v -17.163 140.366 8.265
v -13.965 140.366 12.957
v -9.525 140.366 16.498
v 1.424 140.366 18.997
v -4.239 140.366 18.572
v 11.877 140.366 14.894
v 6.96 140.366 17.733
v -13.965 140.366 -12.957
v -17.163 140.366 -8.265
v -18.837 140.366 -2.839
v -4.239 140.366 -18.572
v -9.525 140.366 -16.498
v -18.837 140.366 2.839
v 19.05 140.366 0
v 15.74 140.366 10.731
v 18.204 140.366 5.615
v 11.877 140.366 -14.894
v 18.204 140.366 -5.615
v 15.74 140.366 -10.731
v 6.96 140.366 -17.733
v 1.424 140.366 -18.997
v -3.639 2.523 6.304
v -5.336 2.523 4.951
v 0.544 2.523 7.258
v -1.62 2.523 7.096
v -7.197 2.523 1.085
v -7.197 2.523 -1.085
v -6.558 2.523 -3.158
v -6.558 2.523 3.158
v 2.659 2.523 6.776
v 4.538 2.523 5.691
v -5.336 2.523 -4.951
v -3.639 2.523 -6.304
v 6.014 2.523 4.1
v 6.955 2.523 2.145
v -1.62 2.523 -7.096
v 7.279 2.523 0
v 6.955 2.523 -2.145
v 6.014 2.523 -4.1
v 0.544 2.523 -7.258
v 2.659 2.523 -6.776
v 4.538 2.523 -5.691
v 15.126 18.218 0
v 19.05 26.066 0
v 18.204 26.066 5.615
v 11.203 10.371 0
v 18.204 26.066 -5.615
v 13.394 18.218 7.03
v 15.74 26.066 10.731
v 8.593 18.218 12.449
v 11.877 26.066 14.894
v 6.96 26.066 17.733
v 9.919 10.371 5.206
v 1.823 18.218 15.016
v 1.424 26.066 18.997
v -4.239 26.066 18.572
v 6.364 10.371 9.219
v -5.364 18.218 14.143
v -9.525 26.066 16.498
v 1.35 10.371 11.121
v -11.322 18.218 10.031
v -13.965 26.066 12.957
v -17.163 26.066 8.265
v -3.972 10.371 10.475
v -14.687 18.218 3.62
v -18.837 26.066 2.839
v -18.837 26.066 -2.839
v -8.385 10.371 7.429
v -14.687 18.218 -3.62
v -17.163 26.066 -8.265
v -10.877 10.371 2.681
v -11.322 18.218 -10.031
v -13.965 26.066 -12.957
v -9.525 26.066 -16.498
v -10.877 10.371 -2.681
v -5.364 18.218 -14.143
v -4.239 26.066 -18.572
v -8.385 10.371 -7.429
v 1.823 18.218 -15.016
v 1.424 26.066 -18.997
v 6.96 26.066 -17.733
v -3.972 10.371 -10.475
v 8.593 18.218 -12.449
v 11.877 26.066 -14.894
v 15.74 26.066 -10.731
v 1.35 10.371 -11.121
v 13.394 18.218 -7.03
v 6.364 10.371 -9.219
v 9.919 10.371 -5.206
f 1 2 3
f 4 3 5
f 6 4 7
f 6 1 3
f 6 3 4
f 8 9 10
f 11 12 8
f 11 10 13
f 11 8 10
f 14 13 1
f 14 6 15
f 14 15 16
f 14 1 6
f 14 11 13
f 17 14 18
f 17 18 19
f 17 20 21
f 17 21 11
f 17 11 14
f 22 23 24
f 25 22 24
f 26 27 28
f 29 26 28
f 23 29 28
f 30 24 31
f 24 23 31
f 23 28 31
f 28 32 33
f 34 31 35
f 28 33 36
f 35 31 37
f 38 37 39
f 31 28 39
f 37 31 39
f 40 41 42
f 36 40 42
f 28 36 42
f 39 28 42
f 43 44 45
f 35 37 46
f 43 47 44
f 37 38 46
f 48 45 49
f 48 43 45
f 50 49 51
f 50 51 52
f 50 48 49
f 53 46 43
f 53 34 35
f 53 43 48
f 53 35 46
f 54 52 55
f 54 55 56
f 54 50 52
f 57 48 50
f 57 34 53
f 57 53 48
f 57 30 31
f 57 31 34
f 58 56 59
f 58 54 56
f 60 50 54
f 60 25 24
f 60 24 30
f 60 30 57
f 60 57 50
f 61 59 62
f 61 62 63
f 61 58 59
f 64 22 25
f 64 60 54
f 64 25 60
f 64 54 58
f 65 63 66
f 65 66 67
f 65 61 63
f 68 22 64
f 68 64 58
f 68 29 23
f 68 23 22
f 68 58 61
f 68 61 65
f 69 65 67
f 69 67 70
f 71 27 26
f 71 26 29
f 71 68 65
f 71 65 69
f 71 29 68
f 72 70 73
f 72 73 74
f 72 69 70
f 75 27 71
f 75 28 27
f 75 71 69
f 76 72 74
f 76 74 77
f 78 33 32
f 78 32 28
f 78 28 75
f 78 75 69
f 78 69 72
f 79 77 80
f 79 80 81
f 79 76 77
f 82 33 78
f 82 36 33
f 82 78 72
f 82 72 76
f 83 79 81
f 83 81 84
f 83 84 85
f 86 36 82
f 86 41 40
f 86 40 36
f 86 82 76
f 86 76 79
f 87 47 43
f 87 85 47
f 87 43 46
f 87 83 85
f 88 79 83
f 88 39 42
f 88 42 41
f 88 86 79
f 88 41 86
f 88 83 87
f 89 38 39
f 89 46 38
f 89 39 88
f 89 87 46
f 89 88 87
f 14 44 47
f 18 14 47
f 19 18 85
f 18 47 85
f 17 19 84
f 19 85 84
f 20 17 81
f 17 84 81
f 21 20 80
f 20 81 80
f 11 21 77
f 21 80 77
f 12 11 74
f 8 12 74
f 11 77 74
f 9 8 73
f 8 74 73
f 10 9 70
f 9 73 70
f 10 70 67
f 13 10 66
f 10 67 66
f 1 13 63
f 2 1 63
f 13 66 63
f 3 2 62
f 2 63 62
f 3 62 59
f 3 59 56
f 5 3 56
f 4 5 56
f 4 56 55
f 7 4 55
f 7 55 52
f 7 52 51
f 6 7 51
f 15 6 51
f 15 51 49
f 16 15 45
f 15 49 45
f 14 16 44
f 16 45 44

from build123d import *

# Parameters (mm, degrees)
SKETCH2_R               = 19.05
BOSS_EXTRUDE1_DEPTH     = 114.3
CUT_EXTRUDE5_DEPTH      = 20.05
CUT_EXTRUDE5_DEPTH_BACK = 20.05


with BuildPart() as part:
    # Sketch1 → Revolve1 (revolve)
    with BuildSketch(Plane.XY):
        Polygon((0, 26.065803987), (19.05, 26.065803987), (0, -12.034196013), align=None)
    revolve(axis=Axis((0, 32.664443941, 0), (0, -1, 0)))

    # Sketch2 → Boss-Extrude1 (add)
    with BuildSketch(Plane(origin=(0, 26.065803987, 0), x_dir=(1, 0, 0), z_dir=(0, 1, 0))):
        Circle(SKETCH2_R)
    extrude(amount=BOSS_EXTRUDE1_DEPTH)

    # Sketch4 → Cut-Extrude5 (cut, two sides)
    with BuildSketch(Plane.XY) as cut_extrude5_sk:
        Polygon((-7.278791919, 2.523387825), (7.278791919, 2.523387825), (0, -12.034196013), align=None)
    extrude(amount=CUT_EXTRUDE5_DEPTH, mode=Mode.SUBTRACT)
    extrude(cut_extrude5_sk.sketch, amount=-CUT_EXTRUDE5_DEPTH_BACK, mode=Mode.SUBTRACT)


solid = part.part
